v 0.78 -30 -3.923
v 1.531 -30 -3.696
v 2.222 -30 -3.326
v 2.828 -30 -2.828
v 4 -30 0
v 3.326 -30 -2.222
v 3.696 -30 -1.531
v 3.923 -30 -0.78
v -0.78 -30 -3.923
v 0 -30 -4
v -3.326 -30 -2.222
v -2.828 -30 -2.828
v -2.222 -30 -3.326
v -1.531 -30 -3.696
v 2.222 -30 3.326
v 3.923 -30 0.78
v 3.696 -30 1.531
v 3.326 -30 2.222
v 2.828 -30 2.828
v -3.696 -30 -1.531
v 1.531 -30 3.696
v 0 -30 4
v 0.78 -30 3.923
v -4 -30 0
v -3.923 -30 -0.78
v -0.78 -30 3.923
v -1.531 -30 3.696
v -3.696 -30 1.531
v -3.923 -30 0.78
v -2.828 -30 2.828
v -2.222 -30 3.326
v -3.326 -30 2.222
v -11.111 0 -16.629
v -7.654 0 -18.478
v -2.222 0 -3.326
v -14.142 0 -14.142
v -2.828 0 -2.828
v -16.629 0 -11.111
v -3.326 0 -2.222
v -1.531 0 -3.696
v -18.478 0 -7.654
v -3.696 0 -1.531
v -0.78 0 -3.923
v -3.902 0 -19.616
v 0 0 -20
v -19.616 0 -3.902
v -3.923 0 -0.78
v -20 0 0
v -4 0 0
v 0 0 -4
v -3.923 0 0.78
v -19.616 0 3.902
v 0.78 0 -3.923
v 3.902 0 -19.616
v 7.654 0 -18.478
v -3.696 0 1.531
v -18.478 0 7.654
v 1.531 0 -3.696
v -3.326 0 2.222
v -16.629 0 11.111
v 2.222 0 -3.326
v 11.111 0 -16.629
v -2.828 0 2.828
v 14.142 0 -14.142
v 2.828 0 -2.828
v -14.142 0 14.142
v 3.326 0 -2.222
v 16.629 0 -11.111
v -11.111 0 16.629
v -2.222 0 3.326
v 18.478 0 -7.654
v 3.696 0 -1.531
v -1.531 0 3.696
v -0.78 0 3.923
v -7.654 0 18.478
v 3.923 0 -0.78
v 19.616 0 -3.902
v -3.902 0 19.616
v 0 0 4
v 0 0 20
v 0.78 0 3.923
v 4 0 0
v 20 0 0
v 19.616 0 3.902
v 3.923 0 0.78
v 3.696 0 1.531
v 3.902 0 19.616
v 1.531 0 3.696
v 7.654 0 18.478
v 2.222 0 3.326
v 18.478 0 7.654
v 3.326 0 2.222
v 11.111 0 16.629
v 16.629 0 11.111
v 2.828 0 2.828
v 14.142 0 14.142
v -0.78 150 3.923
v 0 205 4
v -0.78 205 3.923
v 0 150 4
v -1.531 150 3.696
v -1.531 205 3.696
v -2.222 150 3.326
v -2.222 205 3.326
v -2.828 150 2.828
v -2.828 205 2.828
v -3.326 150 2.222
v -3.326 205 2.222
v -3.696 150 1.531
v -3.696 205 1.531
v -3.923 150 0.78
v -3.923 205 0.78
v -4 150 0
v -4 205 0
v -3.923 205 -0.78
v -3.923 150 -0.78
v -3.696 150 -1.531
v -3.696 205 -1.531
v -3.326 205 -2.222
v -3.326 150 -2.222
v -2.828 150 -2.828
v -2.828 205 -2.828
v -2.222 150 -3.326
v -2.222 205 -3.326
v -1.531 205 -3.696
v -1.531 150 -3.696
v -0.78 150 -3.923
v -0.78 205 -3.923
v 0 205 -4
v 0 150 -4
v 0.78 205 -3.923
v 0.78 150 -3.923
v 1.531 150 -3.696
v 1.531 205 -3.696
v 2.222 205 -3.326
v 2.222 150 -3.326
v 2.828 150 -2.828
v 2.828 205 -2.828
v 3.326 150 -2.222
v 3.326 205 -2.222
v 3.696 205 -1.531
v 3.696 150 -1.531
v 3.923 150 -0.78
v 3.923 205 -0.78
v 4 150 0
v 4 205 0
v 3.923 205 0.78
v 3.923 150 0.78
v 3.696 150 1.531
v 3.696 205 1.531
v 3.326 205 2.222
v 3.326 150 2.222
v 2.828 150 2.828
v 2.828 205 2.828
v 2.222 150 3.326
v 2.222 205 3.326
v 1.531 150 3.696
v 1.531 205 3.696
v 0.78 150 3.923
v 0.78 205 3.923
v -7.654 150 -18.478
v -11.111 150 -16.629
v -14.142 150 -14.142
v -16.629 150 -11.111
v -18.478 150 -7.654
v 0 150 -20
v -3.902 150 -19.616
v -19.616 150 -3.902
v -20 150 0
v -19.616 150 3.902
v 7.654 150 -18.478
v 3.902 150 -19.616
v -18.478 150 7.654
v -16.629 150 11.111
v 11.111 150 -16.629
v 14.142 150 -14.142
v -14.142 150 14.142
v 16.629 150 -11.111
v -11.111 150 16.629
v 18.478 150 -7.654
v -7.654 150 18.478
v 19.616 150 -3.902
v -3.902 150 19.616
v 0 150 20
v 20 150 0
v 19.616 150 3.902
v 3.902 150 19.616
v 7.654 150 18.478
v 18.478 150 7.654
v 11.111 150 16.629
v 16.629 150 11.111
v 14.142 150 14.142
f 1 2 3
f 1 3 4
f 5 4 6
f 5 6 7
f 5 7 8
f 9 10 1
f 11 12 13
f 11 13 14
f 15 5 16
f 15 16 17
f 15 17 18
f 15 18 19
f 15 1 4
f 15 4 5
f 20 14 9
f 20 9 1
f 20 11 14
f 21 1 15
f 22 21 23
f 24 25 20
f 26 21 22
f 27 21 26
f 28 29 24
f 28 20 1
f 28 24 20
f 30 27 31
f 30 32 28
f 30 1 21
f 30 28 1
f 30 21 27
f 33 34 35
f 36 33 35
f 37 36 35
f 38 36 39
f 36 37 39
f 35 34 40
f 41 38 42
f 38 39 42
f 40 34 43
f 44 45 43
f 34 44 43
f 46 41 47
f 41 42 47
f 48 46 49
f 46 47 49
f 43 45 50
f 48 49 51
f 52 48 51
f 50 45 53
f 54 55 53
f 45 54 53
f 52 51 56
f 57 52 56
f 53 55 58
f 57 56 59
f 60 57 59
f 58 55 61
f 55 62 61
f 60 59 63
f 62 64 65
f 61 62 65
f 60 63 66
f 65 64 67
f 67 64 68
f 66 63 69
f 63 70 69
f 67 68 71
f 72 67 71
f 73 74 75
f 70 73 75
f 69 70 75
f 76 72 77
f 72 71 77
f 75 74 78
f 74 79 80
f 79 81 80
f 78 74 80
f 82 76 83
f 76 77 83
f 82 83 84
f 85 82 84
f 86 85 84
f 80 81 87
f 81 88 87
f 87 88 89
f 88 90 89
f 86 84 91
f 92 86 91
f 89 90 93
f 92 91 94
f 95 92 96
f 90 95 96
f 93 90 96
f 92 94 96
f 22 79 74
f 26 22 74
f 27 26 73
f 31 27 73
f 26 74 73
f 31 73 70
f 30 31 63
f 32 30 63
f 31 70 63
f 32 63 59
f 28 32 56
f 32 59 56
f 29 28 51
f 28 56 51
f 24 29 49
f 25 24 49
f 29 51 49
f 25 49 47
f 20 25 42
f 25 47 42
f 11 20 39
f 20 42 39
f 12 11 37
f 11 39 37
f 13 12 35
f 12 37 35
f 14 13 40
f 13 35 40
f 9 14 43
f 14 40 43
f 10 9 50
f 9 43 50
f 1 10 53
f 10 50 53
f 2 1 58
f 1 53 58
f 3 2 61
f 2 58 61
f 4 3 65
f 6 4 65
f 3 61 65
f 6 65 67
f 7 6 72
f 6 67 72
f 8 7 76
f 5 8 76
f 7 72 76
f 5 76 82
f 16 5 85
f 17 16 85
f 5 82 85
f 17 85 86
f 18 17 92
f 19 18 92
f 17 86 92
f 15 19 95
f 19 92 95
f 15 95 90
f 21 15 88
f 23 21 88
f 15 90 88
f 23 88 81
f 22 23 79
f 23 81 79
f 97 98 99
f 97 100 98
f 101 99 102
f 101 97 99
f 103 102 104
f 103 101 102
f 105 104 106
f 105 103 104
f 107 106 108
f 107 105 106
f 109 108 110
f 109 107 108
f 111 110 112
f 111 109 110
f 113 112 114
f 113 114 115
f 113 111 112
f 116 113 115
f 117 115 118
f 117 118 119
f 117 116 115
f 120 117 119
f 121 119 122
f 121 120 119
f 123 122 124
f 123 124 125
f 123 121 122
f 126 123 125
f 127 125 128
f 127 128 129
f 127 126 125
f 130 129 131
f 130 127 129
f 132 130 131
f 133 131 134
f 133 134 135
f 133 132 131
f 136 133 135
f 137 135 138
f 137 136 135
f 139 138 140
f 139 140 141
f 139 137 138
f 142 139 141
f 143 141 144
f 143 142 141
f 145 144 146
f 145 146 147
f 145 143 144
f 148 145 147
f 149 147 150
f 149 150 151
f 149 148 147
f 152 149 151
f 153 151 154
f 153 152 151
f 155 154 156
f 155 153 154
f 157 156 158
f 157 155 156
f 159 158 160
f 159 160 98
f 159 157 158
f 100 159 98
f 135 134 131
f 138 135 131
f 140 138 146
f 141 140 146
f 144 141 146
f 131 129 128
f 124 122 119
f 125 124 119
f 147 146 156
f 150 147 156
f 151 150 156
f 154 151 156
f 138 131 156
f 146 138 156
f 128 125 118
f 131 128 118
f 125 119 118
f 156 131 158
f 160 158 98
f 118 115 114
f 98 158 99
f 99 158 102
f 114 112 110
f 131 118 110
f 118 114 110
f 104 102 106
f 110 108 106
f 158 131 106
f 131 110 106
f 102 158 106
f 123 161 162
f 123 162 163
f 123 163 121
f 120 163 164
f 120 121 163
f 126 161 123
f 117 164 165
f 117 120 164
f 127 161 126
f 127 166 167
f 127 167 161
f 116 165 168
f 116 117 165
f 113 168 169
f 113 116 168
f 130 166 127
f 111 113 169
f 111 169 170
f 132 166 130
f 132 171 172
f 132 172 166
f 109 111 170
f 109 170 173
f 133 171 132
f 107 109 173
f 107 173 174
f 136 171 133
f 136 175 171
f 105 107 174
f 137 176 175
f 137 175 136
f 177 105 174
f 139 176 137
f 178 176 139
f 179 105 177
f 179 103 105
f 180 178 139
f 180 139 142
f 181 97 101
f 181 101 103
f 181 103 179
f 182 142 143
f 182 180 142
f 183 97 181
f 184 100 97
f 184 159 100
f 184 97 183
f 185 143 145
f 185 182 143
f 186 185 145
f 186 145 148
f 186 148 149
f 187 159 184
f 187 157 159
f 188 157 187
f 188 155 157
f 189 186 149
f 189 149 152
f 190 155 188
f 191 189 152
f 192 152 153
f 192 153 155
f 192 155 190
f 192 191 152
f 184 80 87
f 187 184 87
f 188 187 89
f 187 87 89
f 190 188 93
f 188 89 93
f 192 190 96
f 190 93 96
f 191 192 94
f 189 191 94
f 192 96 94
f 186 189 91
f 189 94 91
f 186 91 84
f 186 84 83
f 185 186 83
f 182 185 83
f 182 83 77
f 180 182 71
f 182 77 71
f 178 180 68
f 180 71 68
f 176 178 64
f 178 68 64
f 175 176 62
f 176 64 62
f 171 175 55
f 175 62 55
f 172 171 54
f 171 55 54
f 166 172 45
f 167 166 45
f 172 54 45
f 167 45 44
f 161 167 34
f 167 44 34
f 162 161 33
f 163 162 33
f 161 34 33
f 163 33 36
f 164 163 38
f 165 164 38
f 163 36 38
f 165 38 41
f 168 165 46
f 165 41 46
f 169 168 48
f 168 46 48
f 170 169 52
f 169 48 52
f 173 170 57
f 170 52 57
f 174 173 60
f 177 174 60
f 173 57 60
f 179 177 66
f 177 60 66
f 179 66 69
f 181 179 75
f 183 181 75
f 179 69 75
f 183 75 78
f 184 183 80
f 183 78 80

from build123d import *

# Parameters (mm, degrees)
SKETCH1_R           = 20
BOSS_EXTRUDE1_DEPTH = 150
SKETCH2_R           = 4
BOSS_EXTRUDE2_DEPTH = 30
BOSS_EXTRUDE3_START = -210
SKETCH3_R           = 4
BOSS_EXTRUDE3_DEPTH = 25


with BuildPart() as part:
    # Sketch1 → Boss-Extrude1 (new body)
    with BuildSketch(Plane(origin=(0, 0, 0), x_dir=(1, 0, 0), z_dir=(0, 1, 0))):
        with Locations(Location((0, 0, 0), (0, 0, 270))):
            Circle(SKETCH1_R)
    extrude(amount=BOSS_EXTRUDE1_DEPTH)

    # Sketch2 → Boss-Extrude2 (add)
    with BuildSketch(Plane.XZ):
        with Locations(Location((0, 0, 0), (0, 0, 90))):
            Circle(SKETCH2_R)
    boss_extrude2 = extrude(amount=BOSS_EXTRUDE2_DEPTH)

    # Mirror1: Boss-Extrude2 across plane
    add(boss_extrude2.mirror(Plane(origin=(0, 75, 0), x_dir=(0, 0, 1), z_dir=(0, -1, 0))))

    # Sketch3 → Boss-Extrude3 (add)
    with BuildSketch(Plane.XZ.offset(30).offset(BOSS_EXTRUDE3_START)):
        with Locations(Location((0, 0, 0), (0, 0, 90))):
            Circle(SKETCH3_R)
    extrude(amount=-BOSS_EXTRUDE3_DEPTH)


solid = part.part
